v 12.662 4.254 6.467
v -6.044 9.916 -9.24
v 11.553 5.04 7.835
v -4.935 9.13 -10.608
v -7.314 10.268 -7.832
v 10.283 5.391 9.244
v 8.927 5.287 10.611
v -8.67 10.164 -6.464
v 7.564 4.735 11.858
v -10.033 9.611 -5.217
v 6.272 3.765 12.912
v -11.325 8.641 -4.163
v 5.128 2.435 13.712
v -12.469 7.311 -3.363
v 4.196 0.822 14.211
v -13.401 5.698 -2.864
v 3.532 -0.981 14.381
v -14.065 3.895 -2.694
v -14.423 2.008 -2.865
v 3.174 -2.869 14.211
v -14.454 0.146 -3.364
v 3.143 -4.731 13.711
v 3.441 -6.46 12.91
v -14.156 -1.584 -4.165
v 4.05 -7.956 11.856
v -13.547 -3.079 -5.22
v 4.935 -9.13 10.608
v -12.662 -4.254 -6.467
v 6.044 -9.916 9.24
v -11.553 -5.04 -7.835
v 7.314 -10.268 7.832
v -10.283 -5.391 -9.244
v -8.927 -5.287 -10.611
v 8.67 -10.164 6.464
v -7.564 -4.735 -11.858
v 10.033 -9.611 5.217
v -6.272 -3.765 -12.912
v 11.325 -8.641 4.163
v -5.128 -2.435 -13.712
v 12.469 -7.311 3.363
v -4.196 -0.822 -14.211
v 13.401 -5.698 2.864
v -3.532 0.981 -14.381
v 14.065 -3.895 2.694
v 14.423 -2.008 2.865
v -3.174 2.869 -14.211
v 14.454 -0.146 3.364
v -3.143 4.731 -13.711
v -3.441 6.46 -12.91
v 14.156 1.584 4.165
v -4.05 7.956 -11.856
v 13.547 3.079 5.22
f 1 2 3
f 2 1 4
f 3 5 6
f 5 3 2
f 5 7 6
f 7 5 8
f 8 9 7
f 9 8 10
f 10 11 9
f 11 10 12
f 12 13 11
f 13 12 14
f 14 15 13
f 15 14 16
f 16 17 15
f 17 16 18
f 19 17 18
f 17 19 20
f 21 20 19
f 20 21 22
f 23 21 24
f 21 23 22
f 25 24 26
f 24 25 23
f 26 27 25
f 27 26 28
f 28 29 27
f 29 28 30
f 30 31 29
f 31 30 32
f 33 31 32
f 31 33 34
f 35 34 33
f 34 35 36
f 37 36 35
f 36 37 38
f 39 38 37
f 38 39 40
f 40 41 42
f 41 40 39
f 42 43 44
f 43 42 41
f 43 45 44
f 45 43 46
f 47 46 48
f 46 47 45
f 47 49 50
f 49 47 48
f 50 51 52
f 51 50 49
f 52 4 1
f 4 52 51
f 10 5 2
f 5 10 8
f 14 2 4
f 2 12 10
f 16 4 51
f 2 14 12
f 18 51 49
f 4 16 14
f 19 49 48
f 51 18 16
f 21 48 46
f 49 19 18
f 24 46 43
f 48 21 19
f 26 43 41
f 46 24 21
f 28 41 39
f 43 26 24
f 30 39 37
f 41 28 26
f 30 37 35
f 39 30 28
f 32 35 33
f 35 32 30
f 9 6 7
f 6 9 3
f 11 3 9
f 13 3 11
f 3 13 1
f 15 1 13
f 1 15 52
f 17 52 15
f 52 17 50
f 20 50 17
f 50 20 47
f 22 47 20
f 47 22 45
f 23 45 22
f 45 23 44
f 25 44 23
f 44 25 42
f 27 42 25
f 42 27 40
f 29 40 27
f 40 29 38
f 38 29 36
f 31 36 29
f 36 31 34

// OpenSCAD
// Generated by generate_scads.py
rotate([45,15,60]) {
  cylinder(h=25, r=8, center=true);
}
